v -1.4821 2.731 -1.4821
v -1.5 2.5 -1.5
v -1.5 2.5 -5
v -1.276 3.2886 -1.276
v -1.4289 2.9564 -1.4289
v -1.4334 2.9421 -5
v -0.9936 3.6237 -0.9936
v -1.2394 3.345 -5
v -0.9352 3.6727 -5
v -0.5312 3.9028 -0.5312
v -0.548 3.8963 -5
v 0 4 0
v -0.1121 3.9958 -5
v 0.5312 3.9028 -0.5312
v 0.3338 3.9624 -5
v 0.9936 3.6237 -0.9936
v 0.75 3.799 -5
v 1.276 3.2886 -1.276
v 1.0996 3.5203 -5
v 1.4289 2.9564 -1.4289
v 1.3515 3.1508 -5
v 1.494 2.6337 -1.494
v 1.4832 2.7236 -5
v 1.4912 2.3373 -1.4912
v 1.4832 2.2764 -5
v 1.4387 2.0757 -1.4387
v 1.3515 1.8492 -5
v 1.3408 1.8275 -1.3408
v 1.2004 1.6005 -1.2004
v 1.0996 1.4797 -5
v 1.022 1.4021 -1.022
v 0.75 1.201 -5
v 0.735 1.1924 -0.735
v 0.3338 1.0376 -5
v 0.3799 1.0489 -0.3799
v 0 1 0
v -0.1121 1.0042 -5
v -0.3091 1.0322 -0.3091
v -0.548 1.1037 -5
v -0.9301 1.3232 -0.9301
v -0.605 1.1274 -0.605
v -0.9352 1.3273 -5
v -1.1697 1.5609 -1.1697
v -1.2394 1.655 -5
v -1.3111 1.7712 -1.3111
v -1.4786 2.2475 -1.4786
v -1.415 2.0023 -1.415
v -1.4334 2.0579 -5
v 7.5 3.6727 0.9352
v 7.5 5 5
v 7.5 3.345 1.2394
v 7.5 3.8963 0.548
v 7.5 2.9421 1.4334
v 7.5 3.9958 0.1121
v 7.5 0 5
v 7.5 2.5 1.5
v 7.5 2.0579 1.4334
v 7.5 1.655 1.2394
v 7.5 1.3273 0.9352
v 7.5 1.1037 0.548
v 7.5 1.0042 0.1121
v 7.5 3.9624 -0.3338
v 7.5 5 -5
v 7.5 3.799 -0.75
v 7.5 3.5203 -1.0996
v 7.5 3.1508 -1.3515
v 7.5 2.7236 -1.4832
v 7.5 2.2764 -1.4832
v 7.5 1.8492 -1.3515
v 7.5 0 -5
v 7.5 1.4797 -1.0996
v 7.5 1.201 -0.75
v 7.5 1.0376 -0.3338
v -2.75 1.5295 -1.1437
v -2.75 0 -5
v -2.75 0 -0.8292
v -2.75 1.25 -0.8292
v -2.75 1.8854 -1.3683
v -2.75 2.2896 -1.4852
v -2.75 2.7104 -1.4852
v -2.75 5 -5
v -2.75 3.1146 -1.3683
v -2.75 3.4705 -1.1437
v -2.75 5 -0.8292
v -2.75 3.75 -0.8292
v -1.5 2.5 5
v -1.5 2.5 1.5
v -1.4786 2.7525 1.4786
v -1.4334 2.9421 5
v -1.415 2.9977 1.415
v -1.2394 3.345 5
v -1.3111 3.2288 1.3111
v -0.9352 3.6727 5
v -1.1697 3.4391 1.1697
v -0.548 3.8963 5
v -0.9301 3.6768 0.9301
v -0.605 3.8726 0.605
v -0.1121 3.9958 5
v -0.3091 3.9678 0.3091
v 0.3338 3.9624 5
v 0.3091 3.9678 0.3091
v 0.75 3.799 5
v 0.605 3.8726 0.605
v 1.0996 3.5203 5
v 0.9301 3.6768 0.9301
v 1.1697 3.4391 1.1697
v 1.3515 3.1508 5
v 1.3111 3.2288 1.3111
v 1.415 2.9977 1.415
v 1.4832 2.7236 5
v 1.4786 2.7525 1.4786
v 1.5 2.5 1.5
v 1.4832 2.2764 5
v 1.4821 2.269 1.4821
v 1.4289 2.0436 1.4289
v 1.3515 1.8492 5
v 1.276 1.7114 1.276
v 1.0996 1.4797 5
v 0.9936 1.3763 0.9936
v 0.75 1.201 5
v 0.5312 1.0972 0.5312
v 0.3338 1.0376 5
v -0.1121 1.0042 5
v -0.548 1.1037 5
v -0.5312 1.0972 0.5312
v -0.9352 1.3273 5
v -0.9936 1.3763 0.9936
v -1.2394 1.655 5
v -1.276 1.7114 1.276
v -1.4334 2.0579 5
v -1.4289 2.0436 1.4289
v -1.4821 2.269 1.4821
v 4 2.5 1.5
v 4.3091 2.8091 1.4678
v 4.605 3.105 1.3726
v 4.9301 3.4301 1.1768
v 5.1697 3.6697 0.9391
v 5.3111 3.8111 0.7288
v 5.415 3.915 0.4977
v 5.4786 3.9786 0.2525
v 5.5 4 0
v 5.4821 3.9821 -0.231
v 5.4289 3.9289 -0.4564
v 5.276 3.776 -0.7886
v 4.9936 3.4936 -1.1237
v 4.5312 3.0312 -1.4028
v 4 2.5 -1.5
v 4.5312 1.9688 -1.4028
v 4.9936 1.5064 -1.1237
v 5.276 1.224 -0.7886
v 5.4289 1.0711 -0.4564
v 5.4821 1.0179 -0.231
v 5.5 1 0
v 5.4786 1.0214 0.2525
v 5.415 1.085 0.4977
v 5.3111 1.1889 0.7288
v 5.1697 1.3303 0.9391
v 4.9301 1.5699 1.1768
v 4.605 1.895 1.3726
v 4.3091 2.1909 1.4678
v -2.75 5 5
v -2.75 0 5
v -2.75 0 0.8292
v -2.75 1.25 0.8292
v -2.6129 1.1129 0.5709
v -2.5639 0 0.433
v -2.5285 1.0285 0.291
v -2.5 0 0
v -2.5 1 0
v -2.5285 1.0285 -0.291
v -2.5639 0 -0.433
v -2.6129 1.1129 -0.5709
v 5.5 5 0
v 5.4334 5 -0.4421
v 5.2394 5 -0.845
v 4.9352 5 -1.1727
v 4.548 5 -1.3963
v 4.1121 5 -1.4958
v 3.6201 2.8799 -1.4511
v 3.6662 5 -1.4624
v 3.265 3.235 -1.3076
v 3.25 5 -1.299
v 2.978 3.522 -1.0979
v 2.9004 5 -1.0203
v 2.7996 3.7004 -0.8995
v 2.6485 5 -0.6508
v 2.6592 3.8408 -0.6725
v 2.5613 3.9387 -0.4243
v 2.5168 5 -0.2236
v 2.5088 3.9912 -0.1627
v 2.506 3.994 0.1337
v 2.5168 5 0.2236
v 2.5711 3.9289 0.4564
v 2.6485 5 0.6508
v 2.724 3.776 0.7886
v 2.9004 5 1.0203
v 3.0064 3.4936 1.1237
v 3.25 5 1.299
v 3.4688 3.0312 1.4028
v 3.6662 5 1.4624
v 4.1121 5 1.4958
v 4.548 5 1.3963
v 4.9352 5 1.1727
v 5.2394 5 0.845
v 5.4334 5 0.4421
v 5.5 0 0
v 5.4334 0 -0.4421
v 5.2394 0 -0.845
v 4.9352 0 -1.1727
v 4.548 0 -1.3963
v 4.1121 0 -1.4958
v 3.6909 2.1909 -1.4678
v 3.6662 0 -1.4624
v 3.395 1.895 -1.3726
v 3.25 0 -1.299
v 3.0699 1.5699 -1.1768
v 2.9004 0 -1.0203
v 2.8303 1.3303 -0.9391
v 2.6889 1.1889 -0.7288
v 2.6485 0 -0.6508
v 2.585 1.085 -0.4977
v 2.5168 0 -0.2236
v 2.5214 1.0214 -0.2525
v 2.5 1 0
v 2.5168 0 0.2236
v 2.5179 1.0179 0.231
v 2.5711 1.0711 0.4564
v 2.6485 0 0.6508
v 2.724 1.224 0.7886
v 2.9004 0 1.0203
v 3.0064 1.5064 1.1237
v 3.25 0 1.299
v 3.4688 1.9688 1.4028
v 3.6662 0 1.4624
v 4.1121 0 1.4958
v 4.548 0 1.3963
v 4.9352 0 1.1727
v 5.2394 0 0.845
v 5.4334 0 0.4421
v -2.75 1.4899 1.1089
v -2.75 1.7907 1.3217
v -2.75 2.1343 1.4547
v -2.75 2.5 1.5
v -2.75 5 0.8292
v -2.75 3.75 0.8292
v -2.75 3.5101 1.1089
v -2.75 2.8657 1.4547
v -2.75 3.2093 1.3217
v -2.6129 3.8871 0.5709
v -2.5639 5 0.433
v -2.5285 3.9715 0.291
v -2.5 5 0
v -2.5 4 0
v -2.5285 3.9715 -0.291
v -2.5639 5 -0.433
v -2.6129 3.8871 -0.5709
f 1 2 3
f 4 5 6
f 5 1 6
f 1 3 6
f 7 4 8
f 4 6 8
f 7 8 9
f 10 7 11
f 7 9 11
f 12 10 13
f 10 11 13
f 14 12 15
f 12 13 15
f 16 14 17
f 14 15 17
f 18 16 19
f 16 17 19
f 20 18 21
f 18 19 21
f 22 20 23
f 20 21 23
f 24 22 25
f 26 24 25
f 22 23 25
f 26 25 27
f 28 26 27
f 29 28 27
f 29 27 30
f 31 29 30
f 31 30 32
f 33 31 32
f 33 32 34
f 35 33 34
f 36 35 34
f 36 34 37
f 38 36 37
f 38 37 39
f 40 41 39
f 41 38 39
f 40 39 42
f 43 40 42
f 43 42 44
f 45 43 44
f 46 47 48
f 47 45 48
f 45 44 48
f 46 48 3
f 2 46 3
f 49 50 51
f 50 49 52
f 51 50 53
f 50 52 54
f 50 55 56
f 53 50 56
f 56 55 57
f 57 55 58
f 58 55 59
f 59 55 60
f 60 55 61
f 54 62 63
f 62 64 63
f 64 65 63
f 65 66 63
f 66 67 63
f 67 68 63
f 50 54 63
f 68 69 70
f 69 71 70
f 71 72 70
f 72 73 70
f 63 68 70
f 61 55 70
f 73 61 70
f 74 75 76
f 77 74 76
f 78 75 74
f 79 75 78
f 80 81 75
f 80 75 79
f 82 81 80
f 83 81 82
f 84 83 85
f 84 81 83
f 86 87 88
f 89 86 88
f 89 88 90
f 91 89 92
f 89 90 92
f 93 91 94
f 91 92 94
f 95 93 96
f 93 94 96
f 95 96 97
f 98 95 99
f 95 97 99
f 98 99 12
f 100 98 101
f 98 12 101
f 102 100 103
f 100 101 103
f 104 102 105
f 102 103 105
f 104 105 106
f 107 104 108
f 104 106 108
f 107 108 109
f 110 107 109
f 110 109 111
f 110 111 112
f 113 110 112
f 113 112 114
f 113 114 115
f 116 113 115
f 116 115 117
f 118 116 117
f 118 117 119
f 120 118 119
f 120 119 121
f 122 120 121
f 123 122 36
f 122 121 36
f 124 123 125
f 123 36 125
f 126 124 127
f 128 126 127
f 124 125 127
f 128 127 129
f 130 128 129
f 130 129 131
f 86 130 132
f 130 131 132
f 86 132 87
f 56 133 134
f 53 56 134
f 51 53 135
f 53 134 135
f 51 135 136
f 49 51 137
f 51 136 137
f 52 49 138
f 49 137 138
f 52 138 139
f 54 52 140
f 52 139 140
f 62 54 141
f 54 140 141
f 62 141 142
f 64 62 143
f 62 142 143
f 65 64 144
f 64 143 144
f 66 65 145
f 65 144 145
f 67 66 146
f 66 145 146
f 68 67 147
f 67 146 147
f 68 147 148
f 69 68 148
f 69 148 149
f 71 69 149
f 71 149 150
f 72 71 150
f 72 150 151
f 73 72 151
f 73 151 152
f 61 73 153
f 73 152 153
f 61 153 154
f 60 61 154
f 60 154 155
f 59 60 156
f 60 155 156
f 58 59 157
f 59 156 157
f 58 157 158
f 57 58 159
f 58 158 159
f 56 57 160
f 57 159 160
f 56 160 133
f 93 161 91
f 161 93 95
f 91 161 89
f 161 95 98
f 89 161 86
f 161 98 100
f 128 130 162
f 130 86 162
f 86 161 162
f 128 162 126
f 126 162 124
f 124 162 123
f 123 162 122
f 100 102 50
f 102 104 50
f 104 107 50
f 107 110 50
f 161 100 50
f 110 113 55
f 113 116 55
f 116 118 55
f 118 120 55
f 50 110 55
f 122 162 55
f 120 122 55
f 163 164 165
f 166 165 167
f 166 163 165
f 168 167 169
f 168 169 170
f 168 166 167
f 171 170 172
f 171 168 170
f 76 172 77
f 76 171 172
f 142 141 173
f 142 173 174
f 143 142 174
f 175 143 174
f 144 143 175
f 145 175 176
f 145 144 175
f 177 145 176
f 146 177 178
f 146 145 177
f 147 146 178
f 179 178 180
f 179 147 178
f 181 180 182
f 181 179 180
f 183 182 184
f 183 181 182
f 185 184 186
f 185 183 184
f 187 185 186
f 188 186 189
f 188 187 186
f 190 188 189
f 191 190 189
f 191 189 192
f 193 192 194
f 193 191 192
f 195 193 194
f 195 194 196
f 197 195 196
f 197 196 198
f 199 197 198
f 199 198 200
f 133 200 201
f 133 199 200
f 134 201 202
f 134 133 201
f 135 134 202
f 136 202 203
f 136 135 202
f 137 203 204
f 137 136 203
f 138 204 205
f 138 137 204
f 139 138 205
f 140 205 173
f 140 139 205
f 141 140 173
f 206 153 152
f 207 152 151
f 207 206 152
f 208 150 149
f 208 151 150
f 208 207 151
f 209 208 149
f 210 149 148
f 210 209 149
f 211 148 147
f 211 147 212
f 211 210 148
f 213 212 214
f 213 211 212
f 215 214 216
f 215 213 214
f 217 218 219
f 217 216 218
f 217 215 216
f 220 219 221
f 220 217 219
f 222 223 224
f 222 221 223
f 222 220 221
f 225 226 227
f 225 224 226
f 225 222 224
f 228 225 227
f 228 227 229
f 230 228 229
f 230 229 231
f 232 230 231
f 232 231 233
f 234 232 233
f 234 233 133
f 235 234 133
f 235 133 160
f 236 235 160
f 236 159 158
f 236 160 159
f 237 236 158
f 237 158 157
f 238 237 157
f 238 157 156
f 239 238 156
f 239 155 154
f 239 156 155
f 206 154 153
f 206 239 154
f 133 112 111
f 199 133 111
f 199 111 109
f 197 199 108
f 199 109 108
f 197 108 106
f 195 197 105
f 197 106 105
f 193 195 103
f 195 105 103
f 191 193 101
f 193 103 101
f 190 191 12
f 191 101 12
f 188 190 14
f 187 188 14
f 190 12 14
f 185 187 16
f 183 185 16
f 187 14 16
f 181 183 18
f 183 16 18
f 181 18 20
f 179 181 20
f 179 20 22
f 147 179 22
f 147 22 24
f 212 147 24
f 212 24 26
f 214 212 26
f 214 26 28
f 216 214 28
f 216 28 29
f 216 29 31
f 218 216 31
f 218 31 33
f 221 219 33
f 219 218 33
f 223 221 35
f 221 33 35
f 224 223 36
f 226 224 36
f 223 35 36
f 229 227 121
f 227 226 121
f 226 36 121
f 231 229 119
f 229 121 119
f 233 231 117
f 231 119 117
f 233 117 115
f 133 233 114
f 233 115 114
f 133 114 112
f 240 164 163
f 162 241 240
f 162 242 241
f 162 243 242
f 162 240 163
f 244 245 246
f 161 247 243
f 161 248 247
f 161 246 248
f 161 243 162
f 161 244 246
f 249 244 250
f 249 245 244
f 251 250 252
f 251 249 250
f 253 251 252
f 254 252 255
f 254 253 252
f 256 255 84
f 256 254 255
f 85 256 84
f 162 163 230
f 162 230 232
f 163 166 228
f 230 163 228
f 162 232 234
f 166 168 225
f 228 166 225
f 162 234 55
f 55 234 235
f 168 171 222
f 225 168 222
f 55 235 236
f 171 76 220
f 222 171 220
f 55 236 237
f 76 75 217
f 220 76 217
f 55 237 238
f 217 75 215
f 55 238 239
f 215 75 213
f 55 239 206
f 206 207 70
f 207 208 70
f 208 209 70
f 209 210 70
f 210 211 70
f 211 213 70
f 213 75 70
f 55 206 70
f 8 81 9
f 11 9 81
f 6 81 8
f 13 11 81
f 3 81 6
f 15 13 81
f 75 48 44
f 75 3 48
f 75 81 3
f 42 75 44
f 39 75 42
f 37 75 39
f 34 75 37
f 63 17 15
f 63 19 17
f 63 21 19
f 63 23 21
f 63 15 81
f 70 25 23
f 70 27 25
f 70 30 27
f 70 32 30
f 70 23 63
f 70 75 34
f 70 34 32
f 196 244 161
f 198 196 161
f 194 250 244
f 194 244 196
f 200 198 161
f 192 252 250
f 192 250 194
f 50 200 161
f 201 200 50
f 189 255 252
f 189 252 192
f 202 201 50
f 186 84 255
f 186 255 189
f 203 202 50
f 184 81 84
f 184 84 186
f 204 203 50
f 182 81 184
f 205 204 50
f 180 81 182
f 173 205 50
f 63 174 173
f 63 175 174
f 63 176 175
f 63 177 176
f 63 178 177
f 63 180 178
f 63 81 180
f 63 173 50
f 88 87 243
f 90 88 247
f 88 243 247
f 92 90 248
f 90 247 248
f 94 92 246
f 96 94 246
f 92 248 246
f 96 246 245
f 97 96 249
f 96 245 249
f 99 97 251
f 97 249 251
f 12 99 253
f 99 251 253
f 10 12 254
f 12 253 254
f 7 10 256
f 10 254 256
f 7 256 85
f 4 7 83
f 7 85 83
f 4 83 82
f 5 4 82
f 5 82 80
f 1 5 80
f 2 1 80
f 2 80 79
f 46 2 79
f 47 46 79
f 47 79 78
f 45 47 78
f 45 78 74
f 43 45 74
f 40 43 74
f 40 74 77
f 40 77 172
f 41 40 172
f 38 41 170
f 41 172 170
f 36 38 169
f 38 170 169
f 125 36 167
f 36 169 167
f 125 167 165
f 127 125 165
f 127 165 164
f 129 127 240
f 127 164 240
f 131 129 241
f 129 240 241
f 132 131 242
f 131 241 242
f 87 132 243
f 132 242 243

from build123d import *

# Parameters (mm, degrees)
SKETCH1_W               = 15
SKETCH1_H               = 10
SKETCH1_R               = 1.5
BOSS_EXTRUDE1_DEPTH     = 5
SKETCH2_R               = 1.5
CUT_EXTRUDE1_DEPTH      = 1
CUT_EXTRUDE1_DEPTH_BACK = 16
SKETCH3_R               = 1.5
CUT_EXTRUDE2_DEPTH      = 1
CUT_EXTRUDE2_DEPTH_BACK = 11
SKETCH4_W               = 10
SKETCH4_H               = 5
CUT_EXTRUDE3_DEPTH      = 4.75


with BuildPart() as part:
    # Sketch1 → Boss-Extrude1 (new body)
    with BuildSketch(Plane(origin=(0, 0, 0), x_dir=(1, 0, 0), z_dir=(0, 1, 0))):
        Rectangle(SKETCH1_W, SKETCH1_H)
        with Locations((4, 0)):
            Circle(SKETCH1_R, mode=Mode.SUBTRACT)
        with Locations((-4, 0)):
            Circle(SKETCH1_R, mode=Mode.SUBTRACT)
    extrude(amount=BOSS_EXTRUDE1_DEPTH)

    # Sketch2 → Cut-Extrude1 (cut, two sides)
    with BuildSketch(Plane.ZY.offset(7.5)) as cut_extrude1_sk:
        with Locations((0, 2.5)):
            Circle(SKETCH2_R)
    extrude(amount=CUT_EXTRUDE1_DEPTH, mode=Mode.SUBTRACT)
    extrude(cut_extrude1_sk.sketch, amount=-CUT_EXTRUDE1_DEPTH_BACK, mode=Mode.SUBTRACT)

    # Sketch3 → Cut-Extrude2 (cut, two sides)
    with BuildSketch(Plane(origin=(0, 0, -5), x_dir=(-1, 0, 0), z_dir=(0, 0, -1))) as cut_extrude2_sk:
        with Locations((0, 2.5)):
            Circle(SKETCH3_R)
    extrude(amount=CUT_EXTRUDE2_DEPTH, mode=Mode.SUBTRACT)
    extrude(cut_extrude2_sk.sketch, amount=-CUT_EXTRUDE2_DEPTH_BACK, mode=Mode.SUBTRACT)

    # Sketch4 → Cut-Extrude3 (cut)
    with BuildSketch(Plane.ZY.offset(7.5)):
        with Locations((0, 2.5)):
            Rectangle(SKETCH4_W, SKETCH4_H)
    extrude(amount=-CUT_EXTRUDE3_DEPTH, mode=Mode.SUBTRACT)


solid = part.part
